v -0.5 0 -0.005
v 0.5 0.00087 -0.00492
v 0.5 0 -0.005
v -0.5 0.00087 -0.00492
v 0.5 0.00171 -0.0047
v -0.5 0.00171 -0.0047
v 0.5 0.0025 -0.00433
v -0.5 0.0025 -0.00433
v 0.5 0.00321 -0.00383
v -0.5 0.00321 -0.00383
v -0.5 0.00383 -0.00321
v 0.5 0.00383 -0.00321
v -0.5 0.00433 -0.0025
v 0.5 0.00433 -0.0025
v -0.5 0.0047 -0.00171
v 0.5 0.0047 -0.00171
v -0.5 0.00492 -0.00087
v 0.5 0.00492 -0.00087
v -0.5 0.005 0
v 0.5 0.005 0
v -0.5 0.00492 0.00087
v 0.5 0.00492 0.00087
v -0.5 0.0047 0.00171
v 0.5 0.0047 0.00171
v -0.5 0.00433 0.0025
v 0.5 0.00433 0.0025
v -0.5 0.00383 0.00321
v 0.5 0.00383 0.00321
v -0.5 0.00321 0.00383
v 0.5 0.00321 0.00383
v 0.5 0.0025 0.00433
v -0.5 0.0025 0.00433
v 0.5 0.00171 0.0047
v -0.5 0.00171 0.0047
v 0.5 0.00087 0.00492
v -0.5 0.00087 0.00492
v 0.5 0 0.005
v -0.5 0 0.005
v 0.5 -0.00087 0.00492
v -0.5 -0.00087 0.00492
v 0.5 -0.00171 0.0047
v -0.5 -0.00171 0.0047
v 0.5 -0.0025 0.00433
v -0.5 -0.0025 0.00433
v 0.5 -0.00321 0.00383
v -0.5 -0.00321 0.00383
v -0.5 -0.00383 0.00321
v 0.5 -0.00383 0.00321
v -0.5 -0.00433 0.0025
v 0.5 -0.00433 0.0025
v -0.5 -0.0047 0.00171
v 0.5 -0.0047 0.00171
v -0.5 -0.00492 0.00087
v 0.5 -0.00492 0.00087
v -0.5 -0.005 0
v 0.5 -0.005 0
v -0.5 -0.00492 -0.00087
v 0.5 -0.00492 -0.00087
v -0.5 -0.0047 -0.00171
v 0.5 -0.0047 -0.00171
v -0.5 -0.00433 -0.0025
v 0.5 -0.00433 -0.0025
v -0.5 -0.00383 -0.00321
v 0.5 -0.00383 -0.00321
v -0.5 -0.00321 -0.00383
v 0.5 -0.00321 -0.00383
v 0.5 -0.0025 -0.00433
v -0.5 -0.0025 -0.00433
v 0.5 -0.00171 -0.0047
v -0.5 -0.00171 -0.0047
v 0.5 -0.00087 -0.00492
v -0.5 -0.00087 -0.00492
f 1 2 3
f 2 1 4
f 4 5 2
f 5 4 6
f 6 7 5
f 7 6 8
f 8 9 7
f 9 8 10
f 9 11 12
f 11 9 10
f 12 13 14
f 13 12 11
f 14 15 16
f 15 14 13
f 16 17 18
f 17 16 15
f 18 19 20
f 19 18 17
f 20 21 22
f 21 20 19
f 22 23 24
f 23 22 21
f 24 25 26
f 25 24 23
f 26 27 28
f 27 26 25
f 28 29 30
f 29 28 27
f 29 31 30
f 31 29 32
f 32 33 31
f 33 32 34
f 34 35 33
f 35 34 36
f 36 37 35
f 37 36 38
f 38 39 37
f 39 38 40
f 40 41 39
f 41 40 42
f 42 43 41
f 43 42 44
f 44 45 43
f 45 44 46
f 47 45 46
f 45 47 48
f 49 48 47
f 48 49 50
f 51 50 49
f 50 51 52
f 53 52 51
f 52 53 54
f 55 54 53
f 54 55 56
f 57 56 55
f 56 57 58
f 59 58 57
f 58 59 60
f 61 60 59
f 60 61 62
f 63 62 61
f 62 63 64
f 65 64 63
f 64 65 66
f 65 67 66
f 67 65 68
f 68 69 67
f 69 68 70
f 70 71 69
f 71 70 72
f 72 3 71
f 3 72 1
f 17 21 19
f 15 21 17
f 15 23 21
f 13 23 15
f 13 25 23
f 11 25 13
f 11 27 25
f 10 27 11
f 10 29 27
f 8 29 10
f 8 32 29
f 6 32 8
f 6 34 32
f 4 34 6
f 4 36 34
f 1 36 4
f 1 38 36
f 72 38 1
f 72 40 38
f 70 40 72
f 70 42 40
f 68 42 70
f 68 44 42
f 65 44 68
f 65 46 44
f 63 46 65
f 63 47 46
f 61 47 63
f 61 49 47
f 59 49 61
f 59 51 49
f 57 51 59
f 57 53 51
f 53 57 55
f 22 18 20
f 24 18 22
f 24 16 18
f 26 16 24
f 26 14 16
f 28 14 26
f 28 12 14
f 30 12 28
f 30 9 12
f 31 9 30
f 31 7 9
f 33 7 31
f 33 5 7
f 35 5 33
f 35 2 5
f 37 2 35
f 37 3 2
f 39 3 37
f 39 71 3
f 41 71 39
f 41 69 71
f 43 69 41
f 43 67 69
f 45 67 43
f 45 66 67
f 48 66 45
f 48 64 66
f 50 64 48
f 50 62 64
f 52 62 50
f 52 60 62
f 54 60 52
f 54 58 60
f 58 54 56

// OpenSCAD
// file: lib.scad
function x(v) = v[0];
function y(v) = v[1];
function z(v) = v[2];
function add(v1,v2) = [ for (i = [ 0 : len(v1)-1 ]) v1[i] + v2[i] ];
function xv(d) = [d,0,0];
function yv(d) = [0,d,0];
function zv(d) = [0,0,d];

module box(v) { cube(size=v, center=true); }
module cyl(r1,r2,h) { cylinder(r1=r1, r2=r2, h=h, center=true); }

function grow(n,v) = [x(v)+n*2, y(v)+n*2, z(v)+n*2];

module rbox(v, radius=1) {
	cx = x(v)/2-radius;
	cy = y(v)/2-radius;
	cz = z(v)/2-radius;

	hull() {
		translate([cx,cy,cz]) sphere(r=radius);
		translate([cx,cy,-cz]) sphere(r=radius);
		translate([cx,-cy,cz]) sphere(r=radius);
		translate([cx,-cy,-cz]) sphere(r=radius);
		translate([-cx,cy,cz]) sphere(r=radius);
		translate([-cx,cy,-cz]) sphere(r=radius);
		translate([-cx,-cy,cz]) sphere(r=radius);
		translate([-cx,-cy,-cz]) sphere(r=radius);
	}
}

module fillet(r=1) {
  minkowski() {
    difference() {
      children();
      minkowski() {
        difference() {
          minkowski() {
            children();
            sphere(r=r);
          }
          children();
        }
        sphere(r=r);
      }
    }
    sphere(r=r);
  }
}
// main file
use <lib.scad>

module power() {
	union() {
		rotate([0,90,0]) cyl(0.005, 0.005, 1.0);
	}
}

power($fn=36);
